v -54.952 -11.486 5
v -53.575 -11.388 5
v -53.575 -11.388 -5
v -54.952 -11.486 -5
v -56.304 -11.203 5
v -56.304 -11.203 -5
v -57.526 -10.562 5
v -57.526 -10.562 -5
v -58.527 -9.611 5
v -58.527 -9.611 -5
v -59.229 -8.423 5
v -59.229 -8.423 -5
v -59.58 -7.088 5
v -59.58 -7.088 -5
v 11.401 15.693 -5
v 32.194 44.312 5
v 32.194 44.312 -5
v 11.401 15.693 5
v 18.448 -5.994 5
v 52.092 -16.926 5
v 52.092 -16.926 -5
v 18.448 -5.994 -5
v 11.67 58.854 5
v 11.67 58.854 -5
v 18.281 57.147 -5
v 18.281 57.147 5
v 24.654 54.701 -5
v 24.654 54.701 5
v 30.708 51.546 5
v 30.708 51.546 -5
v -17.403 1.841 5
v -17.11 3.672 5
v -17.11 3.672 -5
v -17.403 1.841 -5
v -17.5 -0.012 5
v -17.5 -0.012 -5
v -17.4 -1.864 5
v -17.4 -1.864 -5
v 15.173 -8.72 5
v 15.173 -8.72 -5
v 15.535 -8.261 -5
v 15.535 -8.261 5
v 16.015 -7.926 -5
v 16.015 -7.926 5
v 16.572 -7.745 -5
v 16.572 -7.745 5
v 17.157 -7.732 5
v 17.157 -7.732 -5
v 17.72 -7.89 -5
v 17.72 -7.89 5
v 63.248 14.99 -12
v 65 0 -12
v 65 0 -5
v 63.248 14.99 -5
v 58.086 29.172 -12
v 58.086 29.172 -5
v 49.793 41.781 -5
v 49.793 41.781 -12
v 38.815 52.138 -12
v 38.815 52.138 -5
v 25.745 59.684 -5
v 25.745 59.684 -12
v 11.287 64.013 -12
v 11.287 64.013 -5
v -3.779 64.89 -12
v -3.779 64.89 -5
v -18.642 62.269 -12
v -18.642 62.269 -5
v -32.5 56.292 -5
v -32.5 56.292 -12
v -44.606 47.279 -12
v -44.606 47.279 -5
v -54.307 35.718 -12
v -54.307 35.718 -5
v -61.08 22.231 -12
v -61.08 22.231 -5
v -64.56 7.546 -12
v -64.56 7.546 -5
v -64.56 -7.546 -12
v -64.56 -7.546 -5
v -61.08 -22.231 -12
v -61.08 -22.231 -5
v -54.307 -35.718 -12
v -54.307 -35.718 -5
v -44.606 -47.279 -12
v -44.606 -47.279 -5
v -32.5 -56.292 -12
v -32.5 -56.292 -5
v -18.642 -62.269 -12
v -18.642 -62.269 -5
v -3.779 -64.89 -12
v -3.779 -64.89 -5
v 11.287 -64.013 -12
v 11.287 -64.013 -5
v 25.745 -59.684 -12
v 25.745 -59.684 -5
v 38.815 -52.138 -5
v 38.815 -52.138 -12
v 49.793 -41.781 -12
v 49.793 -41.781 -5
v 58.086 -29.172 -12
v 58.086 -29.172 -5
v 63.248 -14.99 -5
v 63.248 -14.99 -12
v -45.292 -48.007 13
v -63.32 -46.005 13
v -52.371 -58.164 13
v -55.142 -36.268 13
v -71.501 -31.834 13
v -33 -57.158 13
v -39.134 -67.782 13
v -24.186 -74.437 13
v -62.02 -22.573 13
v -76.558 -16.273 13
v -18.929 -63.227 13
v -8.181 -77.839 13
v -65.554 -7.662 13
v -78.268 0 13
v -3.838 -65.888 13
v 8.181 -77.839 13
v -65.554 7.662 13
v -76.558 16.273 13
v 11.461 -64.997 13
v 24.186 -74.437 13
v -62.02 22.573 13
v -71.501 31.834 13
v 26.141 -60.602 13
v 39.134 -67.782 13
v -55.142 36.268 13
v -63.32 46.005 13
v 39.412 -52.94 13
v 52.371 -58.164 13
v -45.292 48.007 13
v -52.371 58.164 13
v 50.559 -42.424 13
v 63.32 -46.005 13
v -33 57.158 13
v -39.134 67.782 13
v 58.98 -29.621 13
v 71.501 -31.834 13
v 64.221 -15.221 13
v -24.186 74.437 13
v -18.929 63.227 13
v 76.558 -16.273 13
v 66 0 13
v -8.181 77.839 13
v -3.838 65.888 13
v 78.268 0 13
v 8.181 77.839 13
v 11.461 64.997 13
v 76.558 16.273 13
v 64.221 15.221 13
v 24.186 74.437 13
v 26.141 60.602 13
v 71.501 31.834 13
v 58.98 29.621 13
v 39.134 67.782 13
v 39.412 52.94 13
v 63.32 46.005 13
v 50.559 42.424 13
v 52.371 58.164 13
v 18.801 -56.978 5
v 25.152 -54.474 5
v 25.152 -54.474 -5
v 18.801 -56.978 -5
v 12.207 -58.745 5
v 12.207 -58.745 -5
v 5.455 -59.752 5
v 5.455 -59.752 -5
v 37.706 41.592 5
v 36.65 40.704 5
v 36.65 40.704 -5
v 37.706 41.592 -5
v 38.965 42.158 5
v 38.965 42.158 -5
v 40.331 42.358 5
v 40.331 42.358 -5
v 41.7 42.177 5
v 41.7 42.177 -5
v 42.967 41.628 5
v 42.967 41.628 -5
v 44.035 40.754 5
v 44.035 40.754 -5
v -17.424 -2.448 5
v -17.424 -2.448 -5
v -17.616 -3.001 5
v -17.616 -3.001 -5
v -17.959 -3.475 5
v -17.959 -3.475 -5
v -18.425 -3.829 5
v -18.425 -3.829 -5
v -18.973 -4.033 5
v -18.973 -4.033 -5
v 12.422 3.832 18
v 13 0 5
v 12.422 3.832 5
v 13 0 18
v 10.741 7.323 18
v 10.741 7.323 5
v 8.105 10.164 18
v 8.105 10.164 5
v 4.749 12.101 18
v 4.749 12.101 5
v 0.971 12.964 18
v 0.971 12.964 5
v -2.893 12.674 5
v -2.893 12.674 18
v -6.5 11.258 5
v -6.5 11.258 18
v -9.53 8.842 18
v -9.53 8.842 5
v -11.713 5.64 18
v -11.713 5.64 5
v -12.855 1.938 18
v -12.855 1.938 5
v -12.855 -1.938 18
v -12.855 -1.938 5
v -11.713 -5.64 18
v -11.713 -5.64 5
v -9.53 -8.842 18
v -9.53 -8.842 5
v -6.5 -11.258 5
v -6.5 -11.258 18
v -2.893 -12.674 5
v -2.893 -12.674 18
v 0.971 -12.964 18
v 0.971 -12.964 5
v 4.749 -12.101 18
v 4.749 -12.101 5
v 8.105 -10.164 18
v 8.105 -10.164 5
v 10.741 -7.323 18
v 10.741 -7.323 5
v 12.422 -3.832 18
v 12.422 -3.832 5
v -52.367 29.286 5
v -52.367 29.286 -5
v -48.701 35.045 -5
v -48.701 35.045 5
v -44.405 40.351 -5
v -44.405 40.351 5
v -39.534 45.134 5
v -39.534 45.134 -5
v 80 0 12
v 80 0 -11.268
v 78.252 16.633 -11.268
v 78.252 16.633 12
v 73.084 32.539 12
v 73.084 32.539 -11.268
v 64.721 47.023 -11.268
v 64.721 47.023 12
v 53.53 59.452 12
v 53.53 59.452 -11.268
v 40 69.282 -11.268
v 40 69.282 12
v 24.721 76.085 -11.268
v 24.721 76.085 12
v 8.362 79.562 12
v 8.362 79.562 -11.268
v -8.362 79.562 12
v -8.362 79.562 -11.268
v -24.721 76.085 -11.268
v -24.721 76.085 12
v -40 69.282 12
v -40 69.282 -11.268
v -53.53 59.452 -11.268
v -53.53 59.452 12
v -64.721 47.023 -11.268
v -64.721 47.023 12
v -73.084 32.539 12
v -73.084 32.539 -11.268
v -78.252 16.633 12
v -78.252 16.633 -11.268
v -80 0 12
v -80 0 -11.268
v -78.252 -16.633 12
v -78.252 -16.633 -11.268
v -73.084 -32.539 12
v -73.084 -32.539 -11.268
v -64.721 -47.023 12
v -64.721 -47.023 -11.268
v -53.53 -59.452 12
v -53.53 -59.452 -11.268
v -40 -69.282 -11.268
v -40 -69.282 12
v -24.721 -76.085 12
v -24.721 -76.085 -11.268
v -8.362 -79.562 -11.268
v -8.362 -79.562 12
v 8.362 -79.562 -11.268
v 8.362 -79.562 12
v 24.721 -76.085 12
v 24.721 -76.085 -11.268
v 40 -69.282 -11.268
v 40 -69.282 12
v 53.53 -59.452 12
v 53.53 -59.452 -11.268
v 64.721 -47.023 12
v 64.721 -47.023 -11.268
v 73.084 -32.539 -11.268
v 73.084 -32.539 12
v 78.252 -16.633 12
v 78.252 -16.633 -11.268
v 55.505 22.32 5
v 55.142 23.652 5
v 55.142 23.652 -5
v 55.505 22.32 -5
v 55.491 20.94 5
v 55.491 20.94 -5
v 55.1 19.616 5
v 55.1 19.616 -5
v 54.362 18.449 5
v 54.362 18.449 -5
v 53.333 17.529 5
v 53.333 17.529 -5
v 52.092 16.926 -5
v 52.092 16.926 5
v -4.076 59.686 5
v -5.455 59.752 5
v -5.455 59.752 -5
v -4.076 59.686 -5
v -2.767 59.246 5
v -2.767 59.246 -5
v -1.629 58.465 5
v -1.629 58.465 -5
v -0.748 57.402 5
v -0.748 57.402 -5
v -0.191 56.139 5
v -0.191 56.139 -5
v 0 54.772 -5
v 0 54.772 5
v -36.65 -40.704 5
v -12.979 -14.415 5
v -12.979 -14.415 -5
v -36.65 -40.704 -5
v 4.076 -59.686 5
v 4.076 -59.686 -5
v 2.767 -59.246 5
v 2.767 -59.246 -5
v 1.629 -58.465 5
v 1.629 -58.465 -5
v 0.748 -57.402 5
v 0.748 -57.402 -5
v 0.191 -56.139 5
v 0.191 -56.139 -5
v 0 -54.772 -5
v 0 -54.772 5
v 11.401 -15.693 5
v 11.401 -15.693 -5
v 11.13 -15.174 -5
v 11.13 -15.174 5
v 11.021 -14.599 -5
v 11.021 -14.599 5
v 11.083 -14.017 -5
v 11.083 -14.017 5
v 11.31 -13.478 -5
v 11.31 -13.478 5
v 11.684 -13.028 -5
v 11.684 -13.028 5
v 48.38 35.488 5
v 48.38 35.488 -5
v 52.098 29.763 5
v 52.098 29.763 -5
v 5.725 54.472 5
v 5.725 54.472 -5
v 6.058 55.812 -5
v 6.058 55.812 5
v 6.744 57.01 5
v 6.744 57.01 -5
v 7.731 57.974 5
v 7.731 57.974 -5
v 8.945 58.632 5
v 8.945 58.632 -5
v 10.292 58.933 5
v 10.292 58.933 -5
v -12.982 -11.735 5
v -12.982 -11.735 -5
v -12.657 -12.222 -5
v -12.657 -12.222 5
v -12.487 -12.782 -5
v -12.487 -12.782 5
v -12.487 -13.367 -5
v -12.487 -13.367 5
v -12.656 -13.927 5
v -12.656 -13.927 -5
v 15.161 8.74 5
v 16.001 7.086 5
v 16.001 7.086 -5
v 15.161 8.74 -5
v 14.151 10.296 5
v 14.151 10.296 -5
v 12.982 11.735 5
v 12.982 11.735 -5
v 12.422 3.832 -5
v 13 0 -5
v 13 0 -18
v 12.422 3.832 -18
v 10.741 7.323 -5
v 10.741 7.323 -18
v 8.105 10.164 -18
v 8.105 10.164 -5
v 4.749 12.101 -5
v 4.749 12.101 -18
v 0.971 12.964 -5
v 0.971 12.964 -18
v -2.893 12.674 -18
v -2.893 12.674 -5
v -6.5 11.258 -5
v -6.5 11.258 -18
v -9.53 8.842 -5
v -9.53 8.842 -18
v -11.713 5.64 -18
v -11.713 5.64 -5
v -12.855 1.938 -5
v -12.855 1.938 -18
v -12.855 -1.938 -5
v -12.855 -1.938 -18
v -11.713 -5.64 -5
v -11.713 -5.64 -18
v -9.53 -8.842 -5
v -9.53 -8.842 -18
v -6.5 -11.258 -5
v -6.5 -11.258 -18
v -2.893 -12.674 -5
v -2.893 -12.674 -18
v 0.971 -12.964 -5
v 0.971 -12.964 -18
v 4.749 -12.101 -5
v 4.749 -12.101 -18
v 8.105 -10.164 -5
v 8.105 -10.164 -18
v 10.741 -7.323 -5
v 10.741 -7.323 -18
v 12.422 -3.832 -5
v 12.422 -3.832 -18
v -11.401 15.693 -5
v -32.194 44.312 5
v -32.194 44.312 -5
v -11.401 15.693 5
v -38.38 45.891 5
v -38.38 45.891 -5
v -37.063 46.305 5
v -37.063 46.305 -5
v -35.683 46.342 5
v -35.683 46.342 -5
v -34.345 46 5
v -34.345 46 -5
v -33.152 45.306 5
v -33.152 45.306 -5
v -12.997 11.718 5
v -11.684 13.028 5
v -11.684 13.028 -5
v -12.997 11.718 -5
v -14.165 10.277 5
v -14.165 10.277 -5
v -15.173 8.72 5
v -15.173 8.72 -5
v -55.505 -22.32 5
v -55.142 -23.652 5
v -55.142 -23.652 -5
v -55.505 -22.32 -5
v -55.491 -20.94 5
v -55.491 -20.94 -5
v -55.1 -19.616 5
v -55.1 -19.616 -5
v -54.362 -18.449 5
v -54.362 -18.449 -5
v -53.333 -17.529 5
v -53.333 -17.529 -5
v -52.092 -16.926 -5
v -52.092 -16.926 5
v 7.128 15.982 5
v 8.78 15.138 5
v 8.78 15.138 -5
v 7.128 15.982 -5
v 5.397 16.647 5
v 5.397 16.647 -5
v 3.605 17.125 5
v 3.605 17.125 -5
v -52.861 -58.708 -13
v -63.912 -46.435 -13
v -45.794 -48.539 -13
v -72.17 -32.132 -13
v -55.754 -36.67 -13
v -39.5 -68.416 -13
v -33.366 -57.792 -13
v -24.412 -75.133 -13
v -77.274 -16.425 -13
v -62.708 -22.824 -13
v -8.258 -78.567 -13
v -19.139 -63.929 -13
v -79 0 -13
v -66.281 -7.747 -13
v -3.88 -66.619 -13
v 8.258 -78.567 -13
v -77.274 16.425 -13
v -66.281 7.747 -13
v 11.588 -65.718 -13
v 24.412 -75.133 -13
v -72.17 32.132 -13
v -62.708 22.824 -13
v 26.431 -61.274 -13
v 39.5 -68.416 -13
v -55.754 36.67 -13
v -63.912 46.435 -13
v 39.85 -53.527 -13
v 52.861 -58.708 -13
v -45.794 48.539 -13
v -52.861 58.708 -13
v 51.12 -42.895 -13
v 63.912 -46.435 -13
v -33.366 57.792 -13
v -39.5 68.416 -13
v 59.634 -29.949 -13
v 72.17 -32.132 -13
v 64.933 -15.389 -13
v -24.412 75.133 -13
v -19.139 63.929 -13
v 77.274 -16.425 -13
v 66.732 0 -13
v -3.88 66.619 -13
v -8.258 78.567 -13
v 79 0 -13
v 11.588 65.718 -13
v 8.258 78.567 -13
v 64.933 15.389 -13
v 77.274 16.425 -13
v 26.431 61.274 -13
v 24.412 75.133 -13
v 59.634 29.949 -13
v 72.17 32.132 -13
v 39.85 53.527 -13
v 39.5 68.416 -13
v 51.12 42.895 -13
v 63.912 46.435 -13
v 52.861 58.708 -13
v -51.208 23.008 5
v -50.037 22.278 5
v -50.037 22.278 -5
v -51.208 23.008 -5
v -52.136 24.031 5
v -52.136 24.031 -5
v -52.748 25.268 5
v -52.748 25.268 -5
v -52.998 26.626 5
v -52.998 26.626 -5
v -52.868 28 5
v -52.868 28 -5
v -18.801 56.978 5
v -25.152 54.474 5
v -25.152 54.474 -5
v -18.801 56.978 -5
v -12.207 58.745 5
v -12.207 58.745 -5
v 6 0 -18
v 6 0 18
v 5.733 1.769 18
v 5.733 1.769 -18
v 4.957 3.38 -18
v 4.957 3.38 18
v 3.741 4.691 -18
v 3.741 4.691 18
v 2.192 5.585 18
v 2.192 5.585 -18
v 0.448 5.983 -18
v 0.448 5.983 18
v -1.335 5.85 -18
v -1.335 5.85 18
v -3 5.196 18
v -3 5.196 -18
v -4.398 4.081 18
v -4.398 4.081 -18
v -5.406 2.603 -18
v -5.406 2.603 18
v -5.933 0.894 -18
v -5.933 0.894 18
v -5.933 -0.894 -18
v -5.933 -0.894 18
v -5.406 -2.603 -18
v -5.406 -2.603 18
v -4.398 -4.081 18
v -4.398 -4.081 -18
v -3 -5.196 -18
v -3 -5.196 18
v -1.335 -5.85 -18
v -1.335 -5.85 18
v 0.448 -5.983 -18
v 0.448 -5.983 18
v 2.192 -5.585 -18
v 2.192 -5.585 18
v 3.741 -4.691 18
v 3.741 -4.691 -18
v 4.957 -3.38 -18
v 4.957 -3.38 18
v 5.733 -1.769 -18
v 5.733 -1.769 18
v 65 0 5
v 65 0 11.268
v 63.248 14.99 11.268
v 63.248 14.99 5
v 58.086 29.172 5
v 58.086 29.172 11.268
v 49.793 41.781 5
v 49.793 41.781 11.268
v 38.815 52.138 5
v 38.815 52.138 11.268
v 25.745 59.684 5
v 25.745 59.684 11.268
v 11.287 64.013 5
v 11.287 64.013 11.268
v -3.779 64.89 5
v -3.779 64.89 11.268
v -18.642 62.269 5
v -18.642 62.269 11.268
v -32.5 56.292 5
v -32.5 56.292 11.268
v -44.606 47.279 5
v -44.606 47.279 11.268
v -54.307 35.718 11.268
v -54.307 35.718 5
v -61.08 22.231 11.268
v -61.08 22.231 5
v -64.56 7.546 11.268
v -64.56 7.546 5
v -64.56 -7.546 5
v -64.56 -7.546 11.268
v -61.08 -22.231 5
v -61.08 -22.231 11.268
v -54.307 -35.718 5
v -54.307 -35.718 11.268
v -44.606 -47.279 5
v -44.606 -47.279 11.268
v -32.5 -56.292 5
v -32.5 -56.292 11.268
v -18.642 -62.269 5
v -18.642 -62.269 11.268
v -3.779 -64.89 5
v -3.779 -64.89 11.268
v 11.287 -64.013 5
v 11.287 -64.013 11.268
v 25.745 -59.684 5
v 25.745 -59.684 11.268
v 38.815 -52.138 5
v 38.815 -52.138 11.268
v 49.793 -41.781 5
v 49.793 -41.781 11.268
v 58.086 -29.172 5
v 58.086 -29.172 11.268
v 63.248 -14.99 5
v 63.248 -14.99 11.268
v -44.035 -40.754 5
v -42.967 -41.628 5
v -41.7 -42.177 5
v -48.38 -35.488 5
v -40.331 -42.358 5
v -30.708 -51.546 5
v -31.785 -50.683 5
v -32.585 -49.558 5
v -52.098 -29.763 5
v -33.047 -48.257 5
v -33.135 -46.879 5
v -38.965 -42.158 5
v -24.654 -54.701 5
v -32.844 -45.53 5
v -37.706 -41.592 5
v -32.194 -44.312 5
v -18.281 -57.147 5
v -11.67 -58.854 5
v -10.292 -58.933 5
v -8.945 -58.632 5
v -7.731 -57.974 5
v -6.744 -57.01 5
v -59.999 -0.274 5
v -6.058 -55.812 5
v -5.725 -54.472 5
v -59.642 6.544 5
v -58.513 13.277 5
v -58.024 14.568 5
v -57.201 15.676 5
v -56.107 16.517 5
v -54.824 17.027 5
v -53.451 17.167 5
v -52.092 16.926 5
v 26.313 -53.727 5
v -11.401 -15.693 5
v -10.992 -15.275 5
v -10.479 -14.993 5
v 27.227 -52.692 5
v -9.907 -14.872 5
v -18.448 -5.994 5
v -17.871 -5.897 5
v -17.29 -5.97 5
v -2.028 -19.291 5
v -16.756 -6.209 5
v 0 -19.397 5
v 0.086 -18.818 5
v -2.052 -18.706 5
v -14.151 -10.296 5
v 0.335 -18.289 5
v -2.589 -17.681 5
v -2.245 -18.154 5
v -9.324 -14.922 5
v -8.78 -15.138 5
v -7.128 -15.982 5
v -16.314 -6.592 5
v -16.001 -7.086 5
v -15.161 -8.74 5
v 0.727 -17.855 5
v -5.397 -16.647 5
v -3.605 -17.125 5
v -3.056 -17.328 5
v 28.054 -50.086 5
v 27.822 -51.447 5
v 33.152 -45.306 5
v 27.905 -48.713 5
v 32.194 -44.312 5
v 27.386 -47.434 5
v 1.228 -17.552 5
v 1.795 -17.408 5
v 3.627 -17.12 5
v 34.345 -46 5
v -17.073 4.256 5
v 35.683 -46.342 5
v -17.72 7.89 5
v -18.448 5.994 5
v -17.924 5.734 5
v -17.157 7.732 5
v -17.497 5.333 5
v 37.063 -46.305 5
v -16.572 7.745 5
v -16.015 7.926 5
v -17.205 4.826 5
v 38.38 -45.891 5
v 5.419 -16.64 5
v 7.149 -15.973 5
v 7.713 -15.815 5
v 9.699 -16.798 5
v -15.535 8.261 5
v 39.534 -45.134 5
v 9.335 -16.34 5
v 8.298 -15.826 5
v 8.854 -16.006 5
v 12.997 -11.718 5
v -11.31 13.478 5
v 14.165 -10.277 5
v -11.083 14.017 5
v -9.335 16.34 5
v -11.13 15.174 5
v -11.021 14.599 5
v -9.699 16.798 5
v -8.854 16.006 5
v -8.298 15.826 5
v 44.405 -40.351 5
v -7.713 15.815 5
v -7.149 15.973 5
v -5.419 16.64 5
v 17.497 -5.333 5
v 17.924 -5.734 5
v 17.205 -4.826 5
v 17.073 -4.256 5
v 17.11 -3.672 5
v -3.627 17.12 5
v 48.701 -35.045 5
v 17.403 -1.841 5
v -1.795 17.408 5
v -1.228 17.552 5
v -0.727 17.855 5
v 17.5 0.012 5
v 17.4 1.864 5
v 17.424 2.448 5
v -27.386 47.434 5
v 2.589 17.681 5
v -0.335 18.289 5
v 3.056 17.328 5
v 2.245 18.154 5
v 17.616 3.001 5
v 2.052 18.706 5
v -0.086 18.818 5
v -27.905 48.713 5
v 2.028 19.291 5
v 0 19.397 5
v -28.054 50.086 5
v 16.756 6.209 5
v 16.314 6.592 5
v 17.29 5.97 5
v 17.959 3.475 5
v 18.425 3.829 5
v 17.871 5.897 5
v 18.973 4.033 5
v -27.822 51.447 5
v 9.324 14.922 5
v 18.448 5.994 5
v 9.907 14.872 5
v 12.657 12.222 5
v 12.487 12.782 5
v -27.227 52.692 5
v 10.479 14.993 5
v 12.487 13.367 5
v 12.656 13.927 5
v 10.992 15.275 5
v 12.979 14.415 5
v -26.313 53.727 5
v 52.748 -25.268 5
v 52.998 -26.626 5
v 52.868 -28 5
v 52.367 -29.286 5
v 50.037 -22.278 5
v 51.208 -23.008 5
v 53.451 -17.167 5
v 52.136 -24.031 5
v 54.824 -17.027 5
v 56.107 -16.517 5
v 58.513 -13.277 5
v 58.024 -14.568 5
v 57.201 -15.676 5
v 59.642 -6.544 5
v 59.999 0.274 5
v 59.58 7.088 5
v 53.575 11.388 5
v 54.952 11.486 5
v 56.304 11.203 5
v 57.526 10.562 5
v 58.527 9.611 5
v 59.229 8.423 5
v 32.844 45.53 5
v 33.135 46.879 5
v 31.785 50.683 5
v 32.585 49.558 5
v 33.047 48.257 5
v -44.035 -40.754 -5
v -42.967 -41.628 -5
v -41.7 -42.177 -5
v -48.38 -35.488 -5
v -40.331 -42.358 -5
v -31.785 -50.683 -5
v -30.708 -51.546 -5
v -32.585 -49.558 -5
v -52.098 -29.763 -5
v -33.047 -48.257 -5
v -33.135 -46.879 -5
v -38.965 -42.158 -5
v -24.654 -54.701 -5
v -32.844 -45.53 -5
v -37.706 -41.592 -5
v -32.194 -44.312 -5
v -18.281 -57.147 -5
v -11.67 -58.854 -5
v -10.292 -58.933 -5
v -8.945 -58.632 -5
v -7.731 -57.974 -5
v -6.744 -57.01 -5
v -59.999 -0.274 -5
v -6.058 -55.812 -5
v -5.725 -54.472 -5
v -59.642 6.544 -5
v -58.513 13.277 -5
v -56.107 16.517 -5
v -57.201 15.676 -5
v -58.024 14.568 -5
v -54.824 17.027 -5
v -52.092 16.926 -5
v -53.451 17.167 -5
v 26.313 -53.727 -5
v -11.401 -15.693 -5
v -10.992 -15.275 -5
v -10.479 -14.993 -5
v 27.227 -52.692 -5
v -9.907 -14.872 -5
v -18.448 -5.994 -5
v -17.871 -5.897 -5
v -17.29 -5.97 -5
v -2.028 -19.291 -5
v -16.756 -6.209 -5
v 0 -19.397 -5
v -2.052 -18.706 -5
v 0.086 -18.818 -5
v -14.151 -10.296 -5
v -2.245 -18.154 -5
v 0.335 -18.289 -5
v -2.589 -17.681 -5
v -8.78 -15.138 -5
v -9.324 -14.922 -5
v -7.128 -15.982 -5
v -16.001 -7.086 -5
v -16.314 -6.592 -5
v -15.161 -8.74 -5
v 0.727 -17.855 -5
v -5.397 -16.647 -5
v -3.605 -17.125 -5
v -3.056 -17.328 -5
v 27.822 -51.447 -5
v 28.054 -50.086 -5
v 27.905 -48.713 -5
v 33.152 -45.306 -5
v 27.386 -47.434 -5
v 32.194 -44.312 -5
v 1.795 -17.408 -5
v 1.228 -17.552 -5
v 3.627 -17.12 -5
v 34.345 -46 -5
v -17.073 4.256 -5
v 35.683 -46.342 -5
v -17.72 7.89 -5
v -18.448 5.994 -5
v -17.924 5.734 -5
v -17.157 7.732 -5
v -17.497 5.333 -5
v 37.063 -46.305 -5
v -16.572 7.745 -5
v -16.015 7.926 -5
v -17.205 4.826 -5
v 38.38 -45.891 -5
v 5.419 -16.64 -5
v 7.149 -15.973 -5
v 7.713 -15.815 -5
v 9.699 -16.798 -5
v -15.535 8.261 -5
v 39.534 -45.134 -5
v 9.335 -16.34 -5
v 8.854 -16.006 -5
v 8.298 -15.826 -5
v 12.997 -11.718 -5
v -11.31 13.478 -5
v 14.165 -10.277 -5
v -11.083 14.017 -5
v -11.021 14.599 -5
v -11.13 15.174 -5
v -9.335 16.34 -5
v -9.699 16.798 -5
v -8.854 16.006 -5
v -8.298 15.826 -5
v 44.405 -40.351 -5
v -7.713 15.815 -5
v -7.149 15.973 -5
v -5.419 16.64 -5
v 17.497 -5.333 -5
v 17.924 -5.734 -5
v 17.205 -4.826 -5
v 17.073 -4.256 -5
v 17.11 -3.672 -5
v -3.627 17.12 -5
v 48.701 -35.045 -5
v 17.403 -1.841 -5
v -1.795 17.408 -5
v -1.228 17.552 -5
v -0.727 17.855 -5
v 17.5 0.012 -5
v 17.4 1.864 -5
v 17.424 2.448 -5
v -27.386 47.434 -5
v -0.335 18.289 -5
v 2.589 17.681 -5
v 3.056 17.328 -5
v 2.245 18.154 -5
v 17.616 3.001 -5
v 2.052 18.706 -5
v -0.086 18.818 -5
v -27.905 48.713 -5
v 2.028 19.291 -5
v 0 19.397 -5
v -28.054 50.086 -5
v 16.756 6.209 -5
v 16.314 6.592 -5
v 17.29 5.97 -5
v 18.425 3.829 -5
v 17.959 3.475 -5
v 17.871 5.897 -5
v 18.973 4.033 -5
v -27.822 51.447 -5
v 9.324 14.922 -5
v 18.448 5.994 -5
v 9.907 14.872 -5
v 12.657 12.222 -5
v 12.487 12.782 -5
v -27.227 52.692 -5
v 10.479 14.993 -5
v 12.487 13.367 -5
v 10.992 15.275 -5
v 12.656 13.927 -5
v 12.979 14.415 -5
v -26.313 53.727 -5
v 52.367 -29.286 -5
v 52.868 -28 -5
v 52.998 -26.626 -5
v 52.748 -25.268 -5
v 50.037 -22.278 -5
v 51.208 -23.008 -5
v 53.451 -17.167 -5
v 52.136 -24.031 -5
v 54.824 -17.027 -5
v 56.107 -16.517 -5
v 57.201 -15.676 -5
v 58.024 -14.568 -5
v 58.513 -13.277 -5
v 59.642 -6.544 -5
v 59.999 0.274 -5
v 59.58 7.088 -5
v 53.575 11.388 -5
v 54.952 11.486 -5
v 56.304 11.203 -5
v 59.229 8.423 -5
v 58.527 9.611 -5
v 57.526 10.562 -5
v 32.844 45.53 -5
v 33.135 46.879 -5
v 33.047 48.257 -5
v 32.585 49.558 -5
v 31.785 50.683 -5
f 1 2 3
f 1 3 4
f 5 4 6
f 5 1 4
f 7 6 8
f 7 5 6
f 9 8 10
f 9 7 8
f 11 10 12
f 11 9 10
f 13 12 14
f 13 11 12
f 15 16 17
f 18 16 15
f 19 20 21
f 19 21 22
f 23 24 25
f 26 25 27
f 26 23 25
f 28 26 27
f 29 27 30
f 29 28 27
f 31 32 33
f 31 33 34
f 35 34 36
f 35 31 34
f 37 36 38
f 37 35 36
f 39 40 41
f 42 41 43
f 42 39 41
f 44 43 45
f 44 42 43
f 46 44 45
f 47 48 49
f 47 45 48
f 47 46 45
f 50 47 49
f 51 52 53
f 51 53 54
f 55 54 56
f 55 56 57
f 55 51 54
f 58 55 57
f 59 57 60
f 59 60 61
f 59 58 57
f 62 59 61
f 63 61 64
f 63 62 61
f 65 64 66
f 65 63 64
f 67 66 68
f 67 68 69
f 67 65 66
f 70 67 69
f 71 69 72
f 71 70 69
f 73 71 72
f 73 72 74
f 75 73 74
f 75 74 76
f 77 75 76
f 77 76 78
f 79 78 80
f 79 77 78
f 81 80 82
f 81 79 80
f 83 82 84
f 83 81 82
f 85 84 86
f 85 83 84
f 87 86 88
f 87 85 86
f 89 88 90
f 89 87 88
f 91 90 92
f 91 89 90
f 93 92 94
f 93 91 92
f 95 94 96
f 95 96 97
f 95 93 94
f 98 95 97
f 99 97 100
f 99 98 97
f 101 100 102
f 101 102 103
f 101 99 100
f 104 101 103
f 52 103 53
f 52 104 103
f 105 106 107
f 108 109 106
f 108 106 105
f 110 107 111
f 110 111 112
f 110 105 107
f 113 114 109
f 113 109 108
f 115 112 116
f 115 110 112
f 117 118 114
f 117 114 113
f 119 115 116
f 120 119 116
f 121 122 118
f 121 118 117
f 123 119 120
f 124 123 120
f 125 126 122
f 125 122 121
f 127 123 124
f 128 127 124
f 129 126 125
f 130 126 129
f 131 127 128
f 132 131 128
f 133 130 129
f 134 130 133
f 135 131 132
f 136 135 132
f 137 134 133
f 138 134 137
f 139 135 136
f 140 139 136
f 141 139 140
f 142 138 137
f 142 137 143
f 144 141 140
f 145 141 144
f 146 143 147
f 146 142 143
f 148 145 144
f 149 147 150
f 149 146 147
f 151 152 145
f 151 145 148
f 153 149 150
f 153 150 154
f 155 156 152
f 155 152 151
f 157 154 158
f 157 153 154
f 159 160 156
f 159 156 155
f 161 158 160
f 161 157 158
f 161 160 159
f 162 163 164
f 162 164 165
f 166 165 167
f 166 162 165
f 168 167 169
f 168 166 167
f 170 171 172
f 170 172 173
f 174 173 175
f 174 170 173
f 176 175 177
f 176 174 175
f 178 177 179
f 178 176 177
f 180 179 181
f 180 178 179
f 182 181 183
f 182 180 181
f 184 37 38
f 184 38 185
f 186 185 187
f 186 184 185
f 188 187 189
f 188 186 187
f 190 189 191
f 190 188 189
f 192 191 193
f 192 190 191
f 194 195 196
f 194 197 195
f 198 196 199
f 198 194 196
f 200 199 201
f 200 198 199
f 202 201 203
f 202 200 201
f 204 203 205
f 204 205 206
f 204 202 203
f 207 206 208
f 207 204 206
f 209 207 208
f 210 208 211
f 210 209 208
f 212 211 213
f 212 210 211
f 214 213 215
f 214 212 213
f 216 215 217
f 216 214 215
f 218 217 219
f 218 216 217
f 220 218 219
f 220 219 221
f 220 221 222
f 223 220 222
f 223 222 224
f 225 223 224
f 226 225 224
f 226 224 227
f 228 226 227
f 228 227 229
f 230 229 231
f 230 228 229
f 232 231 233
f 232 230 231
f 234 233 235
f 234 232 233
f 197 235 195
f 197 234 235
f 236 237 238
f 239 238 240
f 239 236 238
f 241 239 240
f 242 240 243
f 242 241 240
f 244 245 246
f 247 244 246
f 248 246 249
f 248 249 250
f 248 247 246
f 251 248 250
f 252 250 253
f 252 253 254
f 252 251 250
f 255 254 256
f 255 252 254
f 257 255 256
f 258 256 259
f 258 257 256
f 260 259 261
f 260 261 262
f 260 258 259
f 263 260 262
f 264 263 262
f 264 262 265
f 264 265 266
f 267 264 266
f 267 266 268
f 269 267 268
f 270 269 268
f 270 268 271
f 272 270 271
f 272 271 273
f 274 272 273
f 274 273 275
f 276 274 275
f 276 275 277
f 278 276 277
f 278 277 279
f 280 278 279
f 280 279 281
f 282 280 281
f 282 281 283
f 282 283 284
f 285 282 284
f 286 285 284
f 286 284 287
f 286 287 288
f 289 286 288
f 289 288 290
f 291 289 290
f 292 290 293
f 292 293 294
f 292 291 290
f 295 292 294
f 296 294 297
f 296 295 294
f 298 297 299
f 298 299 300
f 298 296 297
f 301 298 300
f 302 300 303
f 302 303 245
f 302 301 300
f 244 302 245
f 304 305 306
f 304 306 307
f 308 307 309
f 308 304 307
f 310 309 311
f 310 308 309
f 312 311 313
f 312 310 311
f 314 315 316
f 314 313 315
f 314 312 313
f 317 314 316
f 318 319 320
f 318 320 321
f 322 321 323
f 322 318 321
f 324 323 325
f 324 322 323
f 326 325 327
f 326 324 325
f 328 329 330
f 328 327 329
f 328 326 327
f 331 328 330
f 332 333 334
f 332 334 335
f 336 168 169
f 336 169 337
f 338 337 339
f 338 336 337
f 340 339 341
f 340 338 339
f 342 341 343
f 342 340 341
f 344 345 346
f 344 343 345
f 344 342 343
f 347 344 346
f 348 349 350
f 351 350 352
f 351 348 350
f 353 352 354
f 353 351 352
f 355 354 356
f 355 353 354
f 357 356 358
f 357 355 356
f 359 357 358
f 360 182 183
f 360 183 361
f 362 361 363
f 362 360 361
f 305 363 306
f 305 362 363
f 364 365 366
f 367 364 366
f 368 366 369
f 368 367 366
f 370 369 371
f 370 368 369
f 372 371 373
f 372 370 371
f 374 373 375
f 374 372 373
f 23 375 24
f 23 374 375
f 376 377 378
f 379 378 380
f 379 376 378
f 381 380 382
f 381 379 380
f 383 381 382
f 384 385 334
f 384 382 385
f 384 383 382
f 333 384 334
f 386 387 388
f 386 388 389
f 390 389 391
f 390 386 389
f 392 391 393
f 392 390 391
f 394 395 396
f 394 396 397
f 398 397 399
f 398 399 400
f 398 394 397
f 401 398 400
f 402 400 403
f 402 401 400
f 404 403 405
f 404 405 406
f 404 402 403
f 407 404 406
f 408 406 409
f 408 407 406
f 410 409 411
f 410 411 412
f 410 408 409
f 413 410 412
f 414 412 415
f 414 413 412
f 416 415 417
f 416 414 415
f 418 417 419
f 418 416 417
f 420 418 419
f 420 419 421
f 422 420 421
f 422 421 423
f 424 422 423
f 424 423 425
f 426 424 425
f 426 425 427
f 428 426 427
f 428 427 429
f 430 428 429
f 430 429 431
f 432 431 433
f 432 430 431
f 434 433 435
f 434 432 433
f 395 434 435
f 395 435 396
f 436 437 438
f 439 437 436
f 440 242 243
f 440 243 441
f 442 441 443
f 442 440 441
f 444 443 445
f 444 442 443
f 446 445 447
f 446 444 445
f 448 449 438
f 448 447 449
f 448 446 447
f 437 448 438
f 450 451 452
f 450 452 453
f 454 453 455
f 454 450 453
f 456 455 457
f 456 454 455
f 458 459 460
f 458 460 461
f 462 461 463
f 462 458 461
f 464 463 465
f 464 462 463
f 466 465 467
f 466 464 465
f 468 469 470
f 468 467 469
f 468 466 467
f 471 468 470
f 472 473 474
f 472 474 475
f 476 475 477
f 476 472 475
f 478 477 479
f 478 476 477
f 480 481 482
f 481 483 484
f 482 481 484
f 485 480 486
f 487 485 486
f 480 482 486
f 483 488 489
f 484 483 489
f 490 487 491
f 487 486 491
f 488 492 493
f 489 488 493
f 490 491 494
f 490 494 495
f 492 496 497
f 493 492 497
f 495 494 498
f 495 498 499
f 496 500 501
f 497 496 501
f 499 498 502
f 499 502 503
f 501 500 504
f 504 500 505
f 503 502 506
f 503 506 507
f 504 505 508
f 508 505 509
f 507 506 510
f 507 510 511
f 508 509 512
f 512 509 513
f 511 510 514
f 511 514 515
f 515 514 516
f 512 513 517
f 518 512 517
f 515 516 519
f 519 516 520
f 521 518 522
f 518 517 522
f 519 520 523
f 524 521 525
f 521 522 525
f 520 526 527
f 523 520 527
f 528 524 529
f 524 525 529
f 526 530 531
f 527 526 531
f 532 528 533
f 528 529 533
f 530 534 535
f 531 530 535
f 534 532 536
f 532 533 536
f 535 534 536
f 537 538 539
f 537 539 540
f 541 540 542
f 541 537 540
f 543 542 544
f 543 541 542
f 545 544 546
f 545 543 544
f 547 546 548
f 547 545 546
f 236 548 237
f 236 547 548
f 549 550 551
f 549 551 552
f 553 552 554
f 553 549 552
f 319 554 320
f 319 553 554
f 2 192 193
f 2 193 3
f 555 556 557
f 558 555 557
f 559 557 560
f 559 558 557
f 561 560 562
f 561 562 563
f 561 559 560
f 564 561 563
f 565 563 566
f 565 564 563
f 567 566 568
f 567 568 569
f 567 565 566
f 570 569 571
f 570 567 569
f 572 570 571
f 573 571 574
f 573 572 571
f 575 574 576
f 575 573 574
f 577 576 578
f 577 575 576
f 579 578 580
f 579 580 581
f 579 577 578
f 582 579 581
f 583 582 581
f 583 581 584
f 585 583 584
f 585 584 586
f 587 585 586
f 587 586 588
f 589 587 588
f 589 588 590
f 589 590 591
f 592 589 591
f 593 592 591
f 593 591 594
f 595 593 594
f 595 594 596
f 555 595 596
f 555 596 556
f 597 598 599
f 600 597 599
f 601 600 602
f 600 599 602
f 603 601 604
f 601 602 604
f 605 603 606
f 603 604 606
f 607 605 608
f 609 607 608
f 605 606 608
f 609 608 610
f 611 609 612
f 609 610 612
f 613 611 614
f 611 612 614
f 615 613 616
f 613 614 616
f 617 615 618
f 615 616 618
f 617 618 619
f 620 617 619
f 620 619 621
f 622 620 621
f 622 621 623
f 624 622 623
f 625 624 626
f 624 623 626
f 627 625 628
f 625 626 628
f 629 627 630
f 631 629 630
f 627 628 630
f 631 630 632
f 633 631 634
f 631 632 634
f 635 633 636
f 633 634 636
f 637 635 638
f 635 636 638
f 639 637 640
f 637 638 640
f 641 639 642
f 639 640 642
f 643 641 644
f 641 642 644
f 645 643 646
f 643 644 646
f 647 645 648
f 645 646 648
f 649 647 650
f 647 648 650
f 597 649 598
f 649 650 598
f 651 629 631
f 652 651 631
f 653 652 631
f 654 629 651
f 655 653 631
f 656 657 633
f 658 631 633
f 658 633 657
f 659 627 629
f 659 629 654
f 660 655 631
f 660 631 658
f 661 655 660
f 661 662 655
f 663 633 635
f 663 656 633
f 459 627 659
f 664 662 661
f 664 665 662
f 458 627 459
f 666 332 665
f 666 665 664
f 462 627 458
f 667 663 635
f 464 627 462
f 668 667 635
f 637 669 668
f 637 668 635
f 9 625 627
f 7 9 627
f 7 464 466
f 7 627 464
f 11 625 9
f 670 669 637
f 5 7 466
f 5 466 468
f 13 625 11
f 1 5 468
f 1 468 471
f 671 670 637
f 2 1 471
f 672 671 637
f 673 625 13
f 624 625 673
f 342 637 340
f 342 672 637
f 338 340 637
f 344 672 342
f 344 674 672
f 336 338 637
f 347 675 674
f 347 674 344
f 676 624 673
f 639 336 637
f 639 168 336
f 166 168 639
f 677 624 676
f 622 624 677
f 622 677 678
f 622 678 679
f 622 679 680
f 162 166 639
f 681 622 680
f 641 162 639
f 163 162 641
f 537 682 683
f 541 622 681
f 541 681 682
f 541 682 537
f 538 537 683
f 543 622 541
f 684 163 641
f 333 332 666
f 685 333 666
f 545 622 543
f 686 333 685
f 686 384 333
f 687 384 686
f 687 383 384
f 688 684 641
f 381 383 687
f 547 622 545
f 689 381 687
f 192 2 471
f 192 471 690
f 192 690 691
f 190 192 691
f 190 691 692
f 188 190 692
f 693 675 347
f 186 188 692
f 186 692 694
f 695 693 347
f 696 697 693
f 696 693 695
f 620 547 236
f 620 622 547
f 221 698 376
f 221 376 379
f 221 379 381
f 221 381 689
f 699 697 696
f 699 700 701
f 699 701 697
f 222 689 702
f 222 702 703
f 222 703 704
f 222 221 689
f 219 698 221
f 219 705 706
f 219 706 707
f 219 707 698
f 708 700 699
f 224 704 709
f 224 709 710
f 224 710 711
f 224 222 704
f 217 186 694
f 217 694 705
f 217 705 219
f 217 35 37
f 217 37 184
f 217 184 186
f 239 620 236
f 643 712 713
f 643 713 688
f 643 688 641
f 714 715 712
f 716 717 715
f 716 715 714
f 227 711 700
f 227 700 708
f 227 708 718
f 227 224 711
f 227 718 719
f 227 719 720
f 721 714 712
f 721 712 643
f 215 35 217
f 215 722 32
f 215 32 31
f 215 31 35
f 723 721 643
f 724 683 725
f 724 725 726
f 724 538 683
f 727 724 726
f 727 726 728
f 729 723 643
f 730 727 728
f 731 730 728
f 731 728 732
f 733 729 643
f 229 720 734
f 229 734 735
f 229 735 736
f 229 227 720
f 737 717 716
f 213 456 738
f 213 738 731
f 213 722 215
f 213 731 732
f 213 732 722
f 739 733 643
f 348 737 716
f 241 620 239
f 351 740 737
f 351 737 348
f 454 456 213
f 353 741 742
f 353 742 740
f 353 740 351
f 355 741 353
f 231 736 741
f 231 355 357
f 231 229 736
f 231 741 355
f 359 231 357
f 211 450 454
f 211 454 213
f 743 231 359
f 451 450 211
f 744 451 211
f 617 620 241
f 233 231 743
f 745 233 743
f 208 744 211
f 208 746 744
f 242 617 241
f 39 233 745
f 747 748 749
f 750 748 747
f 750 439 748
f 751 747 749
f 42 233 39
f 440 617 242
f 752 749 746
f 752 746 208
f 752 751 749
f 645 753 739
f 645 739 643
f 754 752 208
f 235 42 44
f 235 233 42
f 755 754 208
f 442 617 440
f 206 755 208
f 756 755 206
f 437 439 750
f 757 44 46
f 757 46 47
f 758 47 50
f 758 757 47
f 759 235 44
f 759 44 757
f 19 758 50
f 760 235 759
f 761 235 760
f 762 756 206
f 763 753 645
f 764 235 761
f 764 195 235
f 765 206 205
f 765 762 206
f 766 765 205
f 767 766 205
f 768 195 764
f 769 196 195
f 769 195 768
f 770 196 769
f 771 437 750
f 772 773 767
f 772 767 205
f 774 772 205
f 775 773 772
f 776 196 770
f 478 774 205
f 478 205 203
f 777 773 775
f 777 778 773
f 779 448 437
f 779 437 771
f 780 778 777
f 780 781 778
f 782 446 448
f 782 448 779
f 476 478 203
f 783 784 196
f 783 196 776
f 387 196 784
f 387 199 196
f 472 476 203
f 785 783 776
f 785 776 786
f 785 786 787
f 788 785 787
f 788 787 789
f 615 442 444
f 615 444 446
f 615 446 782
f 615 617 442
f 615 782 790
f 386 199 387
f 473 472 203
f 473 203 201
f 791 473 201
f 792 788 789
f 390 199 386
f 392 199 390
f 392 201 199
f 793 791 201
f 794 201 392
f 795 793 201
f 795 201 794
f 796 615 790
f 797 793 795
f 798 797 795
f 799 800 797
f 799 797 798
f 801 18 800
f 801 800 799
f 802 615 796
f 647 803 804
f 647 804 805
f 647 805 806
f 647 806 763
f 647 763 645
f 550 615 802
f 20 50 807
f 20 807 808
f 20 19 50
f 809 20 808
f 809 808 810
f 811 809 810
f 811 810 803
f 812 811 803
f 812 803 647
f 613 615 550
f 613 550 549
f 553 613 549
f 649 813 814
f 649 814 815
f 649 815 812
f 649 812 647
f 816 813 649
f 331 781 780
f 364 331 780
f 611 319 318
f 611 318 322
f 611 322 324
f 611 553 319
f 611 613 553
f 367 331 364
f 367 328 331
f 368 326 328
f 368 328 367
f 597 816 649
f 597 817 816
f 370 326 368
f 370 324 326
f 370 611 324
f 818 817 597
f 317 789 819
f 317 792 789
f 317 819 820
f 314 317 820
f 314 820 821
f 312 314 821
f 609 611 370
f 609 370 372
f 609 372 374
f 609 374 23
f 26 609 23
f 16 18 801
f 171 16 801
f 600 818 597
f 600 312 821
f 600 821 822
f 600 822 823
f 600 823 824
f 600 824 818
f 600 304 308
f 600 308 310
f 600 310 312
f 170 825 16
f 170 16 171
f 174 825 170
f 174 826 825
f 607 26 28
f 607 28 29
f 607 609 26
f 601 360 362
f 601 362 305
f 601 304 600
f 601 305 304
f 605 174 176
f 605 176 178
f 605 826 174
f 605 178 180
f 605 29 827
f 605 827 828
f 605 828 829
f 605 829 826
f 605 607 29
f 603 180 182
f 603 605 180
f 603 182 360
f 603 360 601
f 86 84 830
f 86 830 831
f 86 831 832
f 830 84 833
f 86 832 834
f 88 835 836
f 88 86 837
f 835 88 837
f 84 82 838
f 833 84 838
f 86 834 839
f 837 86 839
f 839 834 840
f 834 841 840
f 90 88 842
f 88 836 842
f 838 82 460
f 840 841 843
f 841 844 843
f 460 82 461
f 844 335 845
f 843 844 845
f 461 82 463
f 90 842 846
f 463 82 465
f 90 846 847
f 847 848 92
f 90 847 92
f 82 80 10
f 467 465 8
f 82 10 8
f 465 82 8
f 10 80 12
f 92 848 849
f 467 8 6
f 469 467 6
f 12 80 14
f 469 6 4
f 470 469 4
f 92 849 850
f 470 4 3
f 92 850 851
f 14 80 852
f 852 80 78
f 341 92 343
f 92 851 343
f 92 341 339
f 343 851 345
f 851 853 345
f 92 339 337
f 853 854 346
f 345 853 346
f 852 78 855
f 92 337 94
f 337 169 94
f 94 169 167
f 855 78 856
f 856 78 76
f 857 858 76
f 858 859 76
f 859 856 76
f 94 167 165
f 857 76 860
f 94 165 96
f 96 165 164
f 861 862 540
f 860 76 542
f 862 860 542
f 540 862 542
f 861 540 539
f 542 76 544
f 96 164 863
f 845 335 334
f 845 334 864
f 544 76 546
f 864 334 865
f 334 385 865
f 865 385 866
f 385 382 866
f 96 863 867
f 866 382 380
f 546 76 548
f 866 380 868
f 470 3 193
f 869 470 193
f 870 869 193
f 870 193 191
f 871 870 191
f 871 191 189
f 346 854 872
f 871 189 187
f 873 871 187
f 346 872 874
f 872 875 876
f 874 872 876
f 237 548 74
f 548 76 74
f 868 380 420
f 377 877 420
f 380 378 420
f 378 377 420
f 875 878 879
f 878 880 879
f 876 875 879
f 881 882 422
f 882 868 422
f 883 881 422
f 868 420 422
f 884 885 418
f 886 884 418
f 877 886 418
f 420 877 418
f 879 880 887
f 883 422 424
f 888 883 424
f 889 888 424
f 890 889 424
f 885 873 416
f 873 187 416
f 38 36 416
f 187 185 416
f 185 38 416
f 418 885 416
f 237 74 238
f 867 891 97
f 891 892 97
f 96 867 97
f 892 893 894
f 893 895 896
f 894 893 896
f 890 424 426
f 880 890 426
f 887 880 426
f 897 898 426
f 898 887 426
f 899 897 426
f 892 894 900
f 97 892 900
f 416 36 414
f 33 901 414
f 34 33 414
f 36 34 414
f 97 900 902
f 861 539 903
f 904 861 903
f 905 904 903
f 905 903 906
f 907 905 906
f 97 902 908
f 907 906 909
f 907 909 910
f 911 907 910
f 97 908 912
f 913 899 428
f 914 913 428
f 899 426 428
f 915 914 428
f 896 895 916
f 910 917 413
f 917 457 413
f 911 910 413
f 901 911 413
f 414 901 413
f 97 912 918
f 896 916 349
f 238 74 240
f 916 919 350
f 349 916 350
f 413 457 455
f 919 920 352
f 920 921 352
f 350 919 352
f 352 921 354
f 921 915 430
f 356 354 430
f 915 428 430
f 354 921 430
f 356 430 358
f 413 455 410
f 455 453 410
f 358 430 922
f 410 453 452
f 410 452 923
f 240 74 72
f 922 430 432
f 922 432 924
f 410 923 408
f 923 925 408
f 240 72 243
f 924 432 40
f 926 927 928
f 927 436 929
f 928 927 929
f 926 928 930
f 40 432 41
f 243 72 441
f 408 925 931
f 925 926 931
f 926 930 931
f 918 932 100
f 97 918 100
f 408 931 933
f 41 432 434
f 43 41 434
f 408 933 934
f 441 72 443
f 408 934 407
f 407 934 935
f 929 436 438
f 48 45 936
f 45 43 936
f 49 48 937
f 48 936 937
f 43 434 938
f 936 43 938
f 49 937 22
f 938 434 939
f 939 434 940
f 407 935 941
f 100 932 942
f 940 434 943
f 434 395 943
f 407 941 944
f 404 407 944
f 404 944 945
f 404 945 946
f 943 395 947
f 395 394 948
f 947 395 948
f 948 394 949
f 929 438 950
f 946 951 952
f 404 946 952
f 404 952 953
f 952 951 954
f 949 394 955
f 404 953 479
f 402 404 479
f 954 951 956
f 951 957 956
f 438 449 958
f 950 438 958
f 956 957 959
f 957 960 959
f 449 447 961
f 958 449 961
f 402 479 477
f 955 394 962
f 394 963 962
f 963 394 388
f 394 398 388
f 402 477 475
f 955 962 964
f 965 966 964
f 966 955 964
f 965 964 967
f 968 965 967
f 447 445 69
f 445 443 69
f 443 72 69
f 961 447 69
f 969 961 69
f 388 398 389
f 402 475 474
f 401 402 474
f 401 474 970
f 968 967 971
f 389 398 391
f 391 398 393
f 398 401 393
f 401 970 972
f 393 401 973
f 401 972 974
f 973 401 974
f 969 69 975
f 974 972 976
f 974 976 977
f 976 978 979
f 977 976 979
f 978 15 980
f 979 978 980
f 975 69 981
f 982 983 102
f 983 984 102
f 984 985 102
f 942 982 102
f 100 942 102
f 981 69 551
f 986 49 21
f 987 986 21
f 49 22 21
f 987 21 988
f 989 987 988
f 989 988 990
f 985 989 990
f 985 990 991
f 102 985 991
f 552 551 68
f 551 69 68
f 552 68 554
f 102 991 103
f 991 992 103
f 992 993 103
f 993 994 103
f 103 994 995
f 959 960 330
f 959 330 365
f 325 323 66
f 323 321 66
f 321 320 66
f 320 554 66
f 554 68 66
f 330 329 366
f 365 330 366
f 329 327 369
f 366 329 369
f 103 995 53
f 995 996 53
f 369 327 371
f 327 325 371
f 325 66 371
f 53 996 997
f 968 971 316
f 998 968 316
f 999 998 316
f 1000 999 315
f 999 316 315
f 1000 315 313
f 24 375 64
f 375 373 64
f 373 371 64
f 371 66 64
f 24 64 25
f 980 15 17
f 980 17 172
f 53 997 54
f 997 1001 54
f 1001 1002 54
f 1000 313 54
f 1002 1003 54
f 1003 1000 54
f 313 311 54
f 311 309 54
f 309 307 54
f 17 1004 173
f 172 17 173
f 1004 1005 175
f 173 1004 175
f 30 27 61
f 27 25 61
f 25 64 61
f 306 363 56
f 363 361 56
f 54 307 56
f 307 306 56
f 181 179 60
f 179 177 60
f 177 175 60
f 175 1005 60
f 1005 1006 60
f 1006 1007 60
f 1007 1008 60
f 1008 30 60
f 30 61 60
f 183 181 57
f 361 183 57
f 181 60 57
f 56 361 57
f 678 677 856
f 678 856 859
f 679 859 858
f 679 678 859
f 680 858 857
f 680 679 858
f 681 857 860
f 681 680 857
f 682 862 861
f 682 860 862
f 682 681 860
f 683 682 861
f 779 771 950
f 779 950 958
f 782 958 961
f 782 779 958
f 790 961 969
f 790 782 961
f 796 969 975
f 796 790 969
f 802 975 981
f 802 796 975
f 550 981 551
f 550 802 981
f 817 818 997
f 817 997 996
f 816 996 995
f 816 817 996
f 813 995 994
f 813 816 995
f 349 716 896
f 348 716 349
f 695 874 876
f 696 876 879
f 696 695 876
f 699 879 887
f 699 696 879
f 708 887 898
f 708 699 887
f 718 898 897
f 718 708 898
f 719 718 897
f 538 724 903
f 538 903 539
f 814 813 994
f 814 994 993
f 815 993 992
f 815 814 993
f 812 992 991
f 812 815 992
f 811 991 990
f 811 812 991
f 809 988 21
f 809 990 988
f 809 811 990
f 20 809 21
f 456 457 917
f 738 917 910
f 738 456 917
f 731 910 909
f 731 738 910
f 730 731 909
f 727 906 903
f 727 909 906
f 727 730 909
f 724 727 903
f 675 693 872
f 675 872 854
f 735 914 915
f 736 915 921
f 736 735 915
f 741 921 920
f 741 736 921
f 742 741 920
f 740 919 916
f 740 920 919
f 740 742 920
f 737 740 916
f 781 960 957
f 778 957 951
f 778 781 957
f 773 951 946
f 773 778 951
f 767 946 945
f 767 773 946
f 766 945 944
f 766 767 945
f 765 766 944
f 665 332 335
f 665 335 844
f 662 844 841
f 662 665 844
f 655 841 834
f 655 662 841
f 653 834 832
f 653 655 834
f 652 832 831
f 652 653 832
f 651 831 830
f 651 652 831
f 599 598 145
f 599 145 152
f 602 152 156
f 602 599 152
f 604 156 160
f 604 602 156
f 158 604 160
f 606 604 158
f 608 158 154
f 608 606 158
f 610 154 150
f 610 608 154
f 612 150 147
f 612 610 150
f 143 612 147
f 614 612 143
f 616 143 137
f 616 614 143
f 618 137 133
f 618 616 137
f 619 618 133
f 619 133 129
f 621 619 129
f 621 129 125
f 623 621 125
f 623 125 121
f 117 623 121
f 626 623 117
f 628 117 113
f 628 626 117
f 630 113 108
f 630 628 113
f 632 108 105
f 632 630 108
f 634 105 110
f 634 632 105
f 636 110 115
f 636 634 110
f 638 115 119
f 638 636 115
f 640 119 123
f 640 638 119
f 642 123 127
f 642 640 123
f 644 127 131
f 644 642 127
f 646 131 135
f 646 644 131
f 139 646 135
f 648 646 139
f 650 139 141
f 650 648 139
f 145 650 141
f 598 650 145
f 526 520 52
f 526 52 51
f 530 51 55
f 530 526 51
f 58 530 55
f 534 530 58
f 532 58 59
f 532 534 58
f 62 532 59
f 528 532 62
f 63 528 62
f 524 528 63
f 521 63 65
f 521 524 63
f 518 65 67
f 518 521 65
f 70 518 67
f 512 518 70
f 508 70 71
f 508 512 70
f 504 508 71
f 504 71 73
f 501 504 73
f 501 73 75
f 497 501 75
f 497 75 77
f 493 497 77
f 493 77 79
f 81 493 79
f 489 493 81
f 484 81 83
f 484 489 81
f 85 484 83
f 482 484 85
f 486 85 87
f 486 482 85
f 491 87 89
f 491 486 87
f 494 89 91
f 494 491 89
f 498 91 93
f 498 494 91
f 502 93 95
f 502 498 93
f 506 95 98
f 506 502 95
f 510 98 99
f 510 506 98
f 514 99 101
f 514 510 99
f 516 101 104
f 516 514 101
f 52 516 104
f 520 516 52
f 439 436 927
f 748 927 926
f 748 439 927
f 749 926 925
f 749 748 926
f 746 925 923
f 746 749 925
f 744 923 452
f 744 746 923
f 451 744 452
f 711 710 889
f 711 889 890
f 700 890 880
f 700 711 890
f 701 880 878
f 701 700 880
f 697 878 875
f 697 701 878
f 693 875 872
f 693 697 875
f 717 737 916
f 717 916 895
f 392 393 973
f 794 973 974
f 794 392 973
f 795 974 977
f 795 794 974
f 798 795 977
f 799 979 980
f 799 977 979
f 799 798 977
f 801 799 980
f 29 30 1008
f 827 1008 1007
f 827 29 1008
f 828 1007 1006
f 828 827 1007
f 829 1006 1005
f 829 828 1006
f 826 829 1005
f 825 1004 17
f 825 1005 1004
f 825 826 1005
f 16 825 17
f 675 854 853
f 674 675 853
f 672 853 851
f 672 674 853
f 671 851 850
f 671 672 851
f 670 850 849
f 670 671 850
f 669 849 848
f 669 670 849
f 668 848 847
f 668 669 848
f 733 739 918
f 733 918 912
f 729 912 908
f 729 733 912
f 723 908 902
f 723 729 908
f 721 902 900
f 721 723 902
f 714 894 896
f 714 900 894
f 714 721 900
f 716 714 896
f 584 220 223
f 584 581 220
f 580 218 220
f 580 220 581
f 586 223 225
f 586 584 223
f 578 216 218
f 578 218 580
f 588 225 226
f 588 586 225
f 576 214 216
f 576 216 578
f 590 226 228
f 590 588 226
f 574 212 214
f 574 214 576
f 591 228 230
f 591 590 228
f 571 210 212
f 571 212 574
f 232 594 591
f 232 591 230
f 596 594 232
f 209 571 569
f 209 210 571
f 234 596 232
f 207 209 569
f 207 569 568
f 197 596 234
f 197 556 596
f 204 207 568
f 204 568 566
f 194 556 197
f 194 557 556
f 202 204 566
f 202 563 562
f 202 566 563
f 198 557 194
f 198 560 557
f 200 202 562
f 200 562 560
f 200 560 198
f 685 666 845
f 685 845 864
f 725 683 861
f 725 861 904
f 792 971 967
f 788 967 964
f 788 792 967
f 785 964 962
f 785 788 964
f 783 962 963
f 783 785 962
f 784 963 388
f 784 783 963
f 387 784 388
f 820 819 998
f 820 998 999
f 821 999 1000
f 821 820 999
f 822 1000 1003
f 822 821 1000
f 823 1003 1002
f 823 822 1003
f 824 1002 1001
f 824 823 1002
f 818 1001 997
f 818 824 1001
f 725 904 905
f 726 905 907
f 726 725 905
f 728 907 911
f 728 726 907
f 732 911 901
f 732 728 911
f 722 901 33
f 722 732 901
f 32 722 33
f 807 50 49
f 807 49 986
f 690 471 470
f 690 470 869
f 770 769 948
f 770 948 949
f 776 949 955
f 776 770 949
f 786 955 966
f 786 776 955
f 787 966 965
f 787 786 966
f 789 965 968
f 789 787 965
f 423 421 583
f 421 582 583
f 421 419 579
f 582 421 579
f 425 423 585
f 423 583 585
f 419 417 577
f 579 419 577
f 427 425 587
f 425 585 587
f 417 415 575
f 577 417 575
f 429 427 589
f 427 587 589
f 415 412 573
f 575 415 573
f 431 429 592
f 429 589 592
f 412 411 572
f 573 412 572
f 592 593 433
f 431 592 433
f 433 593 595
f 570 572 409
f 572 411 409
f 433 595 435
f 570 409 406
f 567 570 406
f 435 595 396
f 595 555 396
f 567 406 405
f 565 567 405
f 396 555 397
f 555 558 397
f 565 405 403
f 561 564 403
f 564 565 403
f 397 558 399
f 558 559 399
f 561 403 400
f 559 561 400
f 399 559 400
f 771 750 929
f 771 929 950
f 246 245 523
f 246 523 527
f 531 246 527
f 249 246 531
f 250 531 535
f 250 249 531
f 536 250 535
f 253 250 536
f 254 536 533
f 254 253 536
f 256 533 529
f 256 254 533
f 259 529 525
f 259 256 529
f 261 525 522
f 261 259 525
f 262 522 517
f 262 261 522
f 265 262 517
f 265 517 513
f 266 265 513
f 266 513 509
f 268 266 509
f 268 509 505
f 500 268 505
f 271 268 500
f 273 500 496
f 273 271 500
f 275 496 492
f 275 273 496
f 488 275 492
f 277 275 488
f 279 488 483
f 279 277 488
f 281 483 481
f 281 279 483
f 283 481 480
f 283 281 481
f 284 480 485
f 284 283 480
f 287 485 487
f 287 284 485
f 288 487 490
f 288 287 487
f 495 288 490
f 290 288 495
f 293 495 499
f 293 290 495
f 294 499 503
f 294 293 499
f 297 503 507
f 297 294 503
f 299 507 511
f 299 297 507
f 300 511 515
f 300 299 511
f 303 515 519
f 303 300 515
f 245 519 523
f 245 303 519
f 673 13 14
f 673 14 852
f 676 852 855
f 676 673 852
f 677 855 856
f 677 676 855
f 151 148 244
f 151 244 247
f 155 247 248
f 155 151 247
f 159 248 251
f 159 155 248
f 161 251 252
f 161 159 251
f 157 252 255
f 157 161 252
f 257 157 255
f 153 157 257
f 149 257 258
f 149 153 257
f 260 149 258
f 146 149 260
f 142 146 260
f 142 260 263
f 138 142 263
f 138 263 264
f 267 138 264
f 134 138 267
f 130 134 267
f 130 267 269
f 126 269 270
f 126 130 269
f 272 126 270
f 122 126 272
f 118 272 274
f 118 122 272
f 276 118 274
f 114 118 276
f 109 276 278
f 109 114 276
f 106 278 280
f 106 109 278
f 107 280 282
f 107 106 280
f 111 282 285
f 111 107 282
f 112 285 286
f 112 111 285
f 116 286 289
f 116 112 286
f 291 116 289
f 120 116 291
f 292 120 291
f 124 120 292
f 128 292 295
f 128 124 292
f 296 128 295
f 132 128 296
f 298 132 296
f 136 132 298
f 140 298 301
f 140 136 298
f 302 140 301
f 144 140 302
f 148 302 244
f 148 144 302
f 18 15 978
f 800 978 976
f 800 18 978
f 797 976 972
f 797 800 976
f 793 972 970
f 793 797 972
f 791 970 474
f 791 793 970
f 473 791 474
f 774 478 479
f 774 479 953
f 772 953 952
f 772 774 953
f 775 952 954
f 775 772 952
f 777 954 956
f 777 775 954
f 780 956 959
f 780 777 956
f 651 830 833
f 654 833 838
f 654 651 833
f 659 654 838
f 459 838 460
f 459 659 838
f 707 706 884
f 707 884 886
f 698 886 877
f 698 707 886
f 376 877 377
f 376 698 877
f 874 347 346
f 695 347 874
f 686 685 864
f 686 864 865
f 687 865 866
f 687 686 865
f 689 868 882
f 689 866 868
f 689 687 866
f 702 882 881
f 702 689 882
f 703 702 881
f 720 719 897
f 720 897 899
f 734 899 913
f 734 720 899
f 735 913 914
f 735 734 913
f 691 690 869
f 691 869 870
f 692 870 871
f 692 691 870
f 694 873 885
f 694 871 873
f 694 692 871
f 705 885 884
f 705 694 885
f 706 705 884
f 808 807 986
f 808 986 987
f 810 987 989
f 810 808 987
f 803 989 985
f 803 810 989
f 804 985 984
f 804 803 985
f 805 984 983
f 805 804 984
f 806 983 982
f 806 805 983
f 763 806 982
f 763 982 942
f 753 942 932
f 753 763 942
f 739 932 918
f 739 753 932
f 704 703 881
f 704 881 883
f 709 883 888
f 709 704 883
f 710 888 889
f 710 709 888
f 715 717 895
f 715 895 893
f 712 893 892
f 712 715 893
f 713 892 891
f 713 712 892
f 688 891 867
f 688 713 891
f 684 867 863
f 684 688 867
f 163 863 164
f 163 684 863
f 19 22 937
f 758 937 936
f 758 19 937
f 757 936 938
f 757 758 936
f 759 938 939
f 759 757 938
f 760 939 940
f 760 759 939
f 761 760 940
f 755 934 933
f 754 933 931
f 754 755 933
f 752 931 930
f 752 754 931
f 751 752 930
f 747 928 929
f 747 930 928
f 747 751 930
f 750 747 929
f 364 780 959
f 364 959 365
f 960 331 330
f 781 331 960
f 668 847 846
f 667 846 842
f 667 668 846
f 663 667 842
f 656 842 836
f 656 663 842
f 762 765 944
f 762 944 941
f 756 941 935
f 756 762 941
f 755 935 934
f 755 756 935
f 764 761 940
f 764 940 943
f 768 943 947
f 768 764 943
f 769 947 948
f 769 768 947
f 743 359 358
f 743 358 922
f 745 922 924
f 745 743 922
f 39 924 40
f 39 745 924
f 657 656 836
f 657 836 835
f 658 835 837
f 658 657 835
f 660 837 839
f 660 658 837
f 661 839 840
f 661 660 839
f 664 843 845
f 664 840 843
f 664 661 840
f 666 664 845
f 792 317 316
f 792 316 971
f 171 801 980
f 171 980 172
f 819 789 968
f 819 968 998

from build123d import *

# Parameters (mm, degrees)
SKETCH1_R             = 80
SKETCH1_R_2           = 6
BOSS_EXTRUDE1_DEPTH   = 13
SKETCH2_R             = 65
CUT_EXTRUDE1_DEPTH    = 8
SKETCH3_R             = 13
SKETCH3_R_2           = 6
BOSS_EXTRUDE3_DEPTH   = 18
CHAMFER1_SIZE         = 1
CHAMFER1_SIZE2        = 1.732050808
CHAMFER1_PART_2_SIZE  = 1
CHAMFER1_PART_2_SIZE2 = 1.732050808
CHAMFER1_PART_3_SIZE  = 1
CHAMFER1_PART_3_SIZE2 = 1.732050808
CHAMFER1_PART_4_SIZE  = 1
CHAMFER1_PART_4_SIZE2 = 1.732050808
CUT_EXTRUDE2_DEPTH    = 24
CIRPATTERN1_COUNT     = 10


with BuildPart() as part:
    # Sketch1 → Boss-Extrude1 (new body, symmetric)
    with BuildSketch(Plane.XY):
        Circle(SKETCH1_R)
        Circle(SKETCH1_R_2, mode=Mode.SUBTRACT)
    extrude(amount=BOSS_EXTRUDE1_DEPTH, both=True)

    # Sketch2 → Cut-Extrude1 (cut)
    with BuildSketch(Plane.XY.offset(13)):
        Circle(SKETCH2_R)
    cut_extrude1 = extrude(amount=-CUT_EXTRUDE1_DEPTH, mode=Mode.SUBTRACT)

    # Mirror1: Cut-Extrude1 across plane
    add(cut_extrude1.mirror(Plane.XY), mode=Mode.SUBTRACT)

    # Sketch3 → Boss-Extrude3 (add, symmetric)
    with BuildSketch(Plane.XY):
        Circle(SKETCH3_R)
        Circle(SKETCH3_R_2, mode=Mode.SUBTRACT)
    extrude(amount=BOSS_EXTRUDE3_DEPTH, both=True)

    # Chamfer1
    chamfer1_edges = [part.edges().sort_by_distance(p)[0] for p in [
        (-65, 0, 13),
    ]]
    chamfer1_side = [part.faces().sort_by_distance(p)[0] for p in [
        (-77.7372583, 0, 13),
    ]]
    chamfer(chamfer1_edges, length=CHAMFER1_SIZE, length2=CHAMFER1_SIZE2, reference=chamfer1_side[0])

    # Chamfer1 part 2
    chamfer1_part_2_edges = [part.edges().sort_by_distance(p)[0] for p in [
        (-65, 0, -13),
    ]]
    chamfer1_part_2_side = [part.faces().sort_by_distance(p)[0] for p in [
        (-65, 0, -9),
    ]]
    chamfer(chamfer1_part_2_edges, length=CHAMFER1_PART_2_SIZE, length2=CHAMFER1_PART_2_SIZE2, reference=chamfer1_part_2_side[0])

    # Chamfer1 part 3
    chamfer1_part_3_edges = [part.edges().sort_by_distance(p)[0] for p in [
        (-80, 0, -13),
    ]]
    chamfer1_part_3_side = [part.faces().sort_by_distance(p)[0] for p in [
        (-77.7372583, 0, -13),
    ]]
    chamfer(chamfer1_part_3_edges, length=CHAMFER1_PART_3_SIZE, length2=CHAMFER1_PART_3_SIZE2, reference=chamfer1_part_3_side[0])

    # Chamfer1 part 4
    chamfer1_part_4_edges = [part.edges().sort_by_distance(p)[0] for p in [
        (-80, 0, 13),
    ]]
    chamfer1_part_4_side = [part.faces().sort_by_distance(p)[0] for p in [
        (-80, 0, 0),
    ]]
    chamfer(chamfer1_part_4_edges, length=CHAMFER1_PART_4_SIZE, length2=CHAMFER1_PART_4_SIZE2, reference=chamfer1_part_4_side[0])

    # Sketch4 → Cut-Extrude2 (cut, through all)
    with BuildSketch(Plane.XY.offset(5)):
        with BuildLine():
            Line((0, 54.772255751), (0, 19.397164741))
            ThreePointArc((0, 19.397164741), (-0.515032591, 18.057436487), (-1.794871795, 17.407711947))
            ThreePointArc((-1.794871795, 17.407711947), (-4.529333289, 16.90370196), (-7.149451403, 15.972956666))
            ThreePointArc((-7.149451403, 15.972956666), (-8.582686936, 15.895715021), (-9.698582371, 16.798437427))
            Line((-9.698582371, 16.798437427), (-27.386127875, 47.434164903))
            ThreePointArc((-27.386127875, 47.434164903), (-27.821744262, 51.446675992), (-25.152000934, 54.473634439))
            ThreePointArc((-25.152000934, 54.473634439), (-15.529142706, 57.955549577), (-5.454545455, 59.751551728))
            ThreePointArc((-5.454545455, 59.751551728), (-1.629000688, 58.46500048), (0, 54.772255751))
        make_face()
    cut_extrude2 = extrude(amount=-CUT_EXTRUDE2_DEPTH, mode=Mode.SUBTRACT)

    # CirPattern1: Cut-Extrude2 ×10 about axis
    cirpattern1_axis = Axis((0, 0, 0), (0, 0, 1))
    for i in range(1, CIRPATTERN1_COUNT):
        add(cut_extrude2.rotate(cirpattern1_axis, i * 360 / CIRPATTERN1_COUNT), mode=Mode.SUBTRACT)


solid = part.part
